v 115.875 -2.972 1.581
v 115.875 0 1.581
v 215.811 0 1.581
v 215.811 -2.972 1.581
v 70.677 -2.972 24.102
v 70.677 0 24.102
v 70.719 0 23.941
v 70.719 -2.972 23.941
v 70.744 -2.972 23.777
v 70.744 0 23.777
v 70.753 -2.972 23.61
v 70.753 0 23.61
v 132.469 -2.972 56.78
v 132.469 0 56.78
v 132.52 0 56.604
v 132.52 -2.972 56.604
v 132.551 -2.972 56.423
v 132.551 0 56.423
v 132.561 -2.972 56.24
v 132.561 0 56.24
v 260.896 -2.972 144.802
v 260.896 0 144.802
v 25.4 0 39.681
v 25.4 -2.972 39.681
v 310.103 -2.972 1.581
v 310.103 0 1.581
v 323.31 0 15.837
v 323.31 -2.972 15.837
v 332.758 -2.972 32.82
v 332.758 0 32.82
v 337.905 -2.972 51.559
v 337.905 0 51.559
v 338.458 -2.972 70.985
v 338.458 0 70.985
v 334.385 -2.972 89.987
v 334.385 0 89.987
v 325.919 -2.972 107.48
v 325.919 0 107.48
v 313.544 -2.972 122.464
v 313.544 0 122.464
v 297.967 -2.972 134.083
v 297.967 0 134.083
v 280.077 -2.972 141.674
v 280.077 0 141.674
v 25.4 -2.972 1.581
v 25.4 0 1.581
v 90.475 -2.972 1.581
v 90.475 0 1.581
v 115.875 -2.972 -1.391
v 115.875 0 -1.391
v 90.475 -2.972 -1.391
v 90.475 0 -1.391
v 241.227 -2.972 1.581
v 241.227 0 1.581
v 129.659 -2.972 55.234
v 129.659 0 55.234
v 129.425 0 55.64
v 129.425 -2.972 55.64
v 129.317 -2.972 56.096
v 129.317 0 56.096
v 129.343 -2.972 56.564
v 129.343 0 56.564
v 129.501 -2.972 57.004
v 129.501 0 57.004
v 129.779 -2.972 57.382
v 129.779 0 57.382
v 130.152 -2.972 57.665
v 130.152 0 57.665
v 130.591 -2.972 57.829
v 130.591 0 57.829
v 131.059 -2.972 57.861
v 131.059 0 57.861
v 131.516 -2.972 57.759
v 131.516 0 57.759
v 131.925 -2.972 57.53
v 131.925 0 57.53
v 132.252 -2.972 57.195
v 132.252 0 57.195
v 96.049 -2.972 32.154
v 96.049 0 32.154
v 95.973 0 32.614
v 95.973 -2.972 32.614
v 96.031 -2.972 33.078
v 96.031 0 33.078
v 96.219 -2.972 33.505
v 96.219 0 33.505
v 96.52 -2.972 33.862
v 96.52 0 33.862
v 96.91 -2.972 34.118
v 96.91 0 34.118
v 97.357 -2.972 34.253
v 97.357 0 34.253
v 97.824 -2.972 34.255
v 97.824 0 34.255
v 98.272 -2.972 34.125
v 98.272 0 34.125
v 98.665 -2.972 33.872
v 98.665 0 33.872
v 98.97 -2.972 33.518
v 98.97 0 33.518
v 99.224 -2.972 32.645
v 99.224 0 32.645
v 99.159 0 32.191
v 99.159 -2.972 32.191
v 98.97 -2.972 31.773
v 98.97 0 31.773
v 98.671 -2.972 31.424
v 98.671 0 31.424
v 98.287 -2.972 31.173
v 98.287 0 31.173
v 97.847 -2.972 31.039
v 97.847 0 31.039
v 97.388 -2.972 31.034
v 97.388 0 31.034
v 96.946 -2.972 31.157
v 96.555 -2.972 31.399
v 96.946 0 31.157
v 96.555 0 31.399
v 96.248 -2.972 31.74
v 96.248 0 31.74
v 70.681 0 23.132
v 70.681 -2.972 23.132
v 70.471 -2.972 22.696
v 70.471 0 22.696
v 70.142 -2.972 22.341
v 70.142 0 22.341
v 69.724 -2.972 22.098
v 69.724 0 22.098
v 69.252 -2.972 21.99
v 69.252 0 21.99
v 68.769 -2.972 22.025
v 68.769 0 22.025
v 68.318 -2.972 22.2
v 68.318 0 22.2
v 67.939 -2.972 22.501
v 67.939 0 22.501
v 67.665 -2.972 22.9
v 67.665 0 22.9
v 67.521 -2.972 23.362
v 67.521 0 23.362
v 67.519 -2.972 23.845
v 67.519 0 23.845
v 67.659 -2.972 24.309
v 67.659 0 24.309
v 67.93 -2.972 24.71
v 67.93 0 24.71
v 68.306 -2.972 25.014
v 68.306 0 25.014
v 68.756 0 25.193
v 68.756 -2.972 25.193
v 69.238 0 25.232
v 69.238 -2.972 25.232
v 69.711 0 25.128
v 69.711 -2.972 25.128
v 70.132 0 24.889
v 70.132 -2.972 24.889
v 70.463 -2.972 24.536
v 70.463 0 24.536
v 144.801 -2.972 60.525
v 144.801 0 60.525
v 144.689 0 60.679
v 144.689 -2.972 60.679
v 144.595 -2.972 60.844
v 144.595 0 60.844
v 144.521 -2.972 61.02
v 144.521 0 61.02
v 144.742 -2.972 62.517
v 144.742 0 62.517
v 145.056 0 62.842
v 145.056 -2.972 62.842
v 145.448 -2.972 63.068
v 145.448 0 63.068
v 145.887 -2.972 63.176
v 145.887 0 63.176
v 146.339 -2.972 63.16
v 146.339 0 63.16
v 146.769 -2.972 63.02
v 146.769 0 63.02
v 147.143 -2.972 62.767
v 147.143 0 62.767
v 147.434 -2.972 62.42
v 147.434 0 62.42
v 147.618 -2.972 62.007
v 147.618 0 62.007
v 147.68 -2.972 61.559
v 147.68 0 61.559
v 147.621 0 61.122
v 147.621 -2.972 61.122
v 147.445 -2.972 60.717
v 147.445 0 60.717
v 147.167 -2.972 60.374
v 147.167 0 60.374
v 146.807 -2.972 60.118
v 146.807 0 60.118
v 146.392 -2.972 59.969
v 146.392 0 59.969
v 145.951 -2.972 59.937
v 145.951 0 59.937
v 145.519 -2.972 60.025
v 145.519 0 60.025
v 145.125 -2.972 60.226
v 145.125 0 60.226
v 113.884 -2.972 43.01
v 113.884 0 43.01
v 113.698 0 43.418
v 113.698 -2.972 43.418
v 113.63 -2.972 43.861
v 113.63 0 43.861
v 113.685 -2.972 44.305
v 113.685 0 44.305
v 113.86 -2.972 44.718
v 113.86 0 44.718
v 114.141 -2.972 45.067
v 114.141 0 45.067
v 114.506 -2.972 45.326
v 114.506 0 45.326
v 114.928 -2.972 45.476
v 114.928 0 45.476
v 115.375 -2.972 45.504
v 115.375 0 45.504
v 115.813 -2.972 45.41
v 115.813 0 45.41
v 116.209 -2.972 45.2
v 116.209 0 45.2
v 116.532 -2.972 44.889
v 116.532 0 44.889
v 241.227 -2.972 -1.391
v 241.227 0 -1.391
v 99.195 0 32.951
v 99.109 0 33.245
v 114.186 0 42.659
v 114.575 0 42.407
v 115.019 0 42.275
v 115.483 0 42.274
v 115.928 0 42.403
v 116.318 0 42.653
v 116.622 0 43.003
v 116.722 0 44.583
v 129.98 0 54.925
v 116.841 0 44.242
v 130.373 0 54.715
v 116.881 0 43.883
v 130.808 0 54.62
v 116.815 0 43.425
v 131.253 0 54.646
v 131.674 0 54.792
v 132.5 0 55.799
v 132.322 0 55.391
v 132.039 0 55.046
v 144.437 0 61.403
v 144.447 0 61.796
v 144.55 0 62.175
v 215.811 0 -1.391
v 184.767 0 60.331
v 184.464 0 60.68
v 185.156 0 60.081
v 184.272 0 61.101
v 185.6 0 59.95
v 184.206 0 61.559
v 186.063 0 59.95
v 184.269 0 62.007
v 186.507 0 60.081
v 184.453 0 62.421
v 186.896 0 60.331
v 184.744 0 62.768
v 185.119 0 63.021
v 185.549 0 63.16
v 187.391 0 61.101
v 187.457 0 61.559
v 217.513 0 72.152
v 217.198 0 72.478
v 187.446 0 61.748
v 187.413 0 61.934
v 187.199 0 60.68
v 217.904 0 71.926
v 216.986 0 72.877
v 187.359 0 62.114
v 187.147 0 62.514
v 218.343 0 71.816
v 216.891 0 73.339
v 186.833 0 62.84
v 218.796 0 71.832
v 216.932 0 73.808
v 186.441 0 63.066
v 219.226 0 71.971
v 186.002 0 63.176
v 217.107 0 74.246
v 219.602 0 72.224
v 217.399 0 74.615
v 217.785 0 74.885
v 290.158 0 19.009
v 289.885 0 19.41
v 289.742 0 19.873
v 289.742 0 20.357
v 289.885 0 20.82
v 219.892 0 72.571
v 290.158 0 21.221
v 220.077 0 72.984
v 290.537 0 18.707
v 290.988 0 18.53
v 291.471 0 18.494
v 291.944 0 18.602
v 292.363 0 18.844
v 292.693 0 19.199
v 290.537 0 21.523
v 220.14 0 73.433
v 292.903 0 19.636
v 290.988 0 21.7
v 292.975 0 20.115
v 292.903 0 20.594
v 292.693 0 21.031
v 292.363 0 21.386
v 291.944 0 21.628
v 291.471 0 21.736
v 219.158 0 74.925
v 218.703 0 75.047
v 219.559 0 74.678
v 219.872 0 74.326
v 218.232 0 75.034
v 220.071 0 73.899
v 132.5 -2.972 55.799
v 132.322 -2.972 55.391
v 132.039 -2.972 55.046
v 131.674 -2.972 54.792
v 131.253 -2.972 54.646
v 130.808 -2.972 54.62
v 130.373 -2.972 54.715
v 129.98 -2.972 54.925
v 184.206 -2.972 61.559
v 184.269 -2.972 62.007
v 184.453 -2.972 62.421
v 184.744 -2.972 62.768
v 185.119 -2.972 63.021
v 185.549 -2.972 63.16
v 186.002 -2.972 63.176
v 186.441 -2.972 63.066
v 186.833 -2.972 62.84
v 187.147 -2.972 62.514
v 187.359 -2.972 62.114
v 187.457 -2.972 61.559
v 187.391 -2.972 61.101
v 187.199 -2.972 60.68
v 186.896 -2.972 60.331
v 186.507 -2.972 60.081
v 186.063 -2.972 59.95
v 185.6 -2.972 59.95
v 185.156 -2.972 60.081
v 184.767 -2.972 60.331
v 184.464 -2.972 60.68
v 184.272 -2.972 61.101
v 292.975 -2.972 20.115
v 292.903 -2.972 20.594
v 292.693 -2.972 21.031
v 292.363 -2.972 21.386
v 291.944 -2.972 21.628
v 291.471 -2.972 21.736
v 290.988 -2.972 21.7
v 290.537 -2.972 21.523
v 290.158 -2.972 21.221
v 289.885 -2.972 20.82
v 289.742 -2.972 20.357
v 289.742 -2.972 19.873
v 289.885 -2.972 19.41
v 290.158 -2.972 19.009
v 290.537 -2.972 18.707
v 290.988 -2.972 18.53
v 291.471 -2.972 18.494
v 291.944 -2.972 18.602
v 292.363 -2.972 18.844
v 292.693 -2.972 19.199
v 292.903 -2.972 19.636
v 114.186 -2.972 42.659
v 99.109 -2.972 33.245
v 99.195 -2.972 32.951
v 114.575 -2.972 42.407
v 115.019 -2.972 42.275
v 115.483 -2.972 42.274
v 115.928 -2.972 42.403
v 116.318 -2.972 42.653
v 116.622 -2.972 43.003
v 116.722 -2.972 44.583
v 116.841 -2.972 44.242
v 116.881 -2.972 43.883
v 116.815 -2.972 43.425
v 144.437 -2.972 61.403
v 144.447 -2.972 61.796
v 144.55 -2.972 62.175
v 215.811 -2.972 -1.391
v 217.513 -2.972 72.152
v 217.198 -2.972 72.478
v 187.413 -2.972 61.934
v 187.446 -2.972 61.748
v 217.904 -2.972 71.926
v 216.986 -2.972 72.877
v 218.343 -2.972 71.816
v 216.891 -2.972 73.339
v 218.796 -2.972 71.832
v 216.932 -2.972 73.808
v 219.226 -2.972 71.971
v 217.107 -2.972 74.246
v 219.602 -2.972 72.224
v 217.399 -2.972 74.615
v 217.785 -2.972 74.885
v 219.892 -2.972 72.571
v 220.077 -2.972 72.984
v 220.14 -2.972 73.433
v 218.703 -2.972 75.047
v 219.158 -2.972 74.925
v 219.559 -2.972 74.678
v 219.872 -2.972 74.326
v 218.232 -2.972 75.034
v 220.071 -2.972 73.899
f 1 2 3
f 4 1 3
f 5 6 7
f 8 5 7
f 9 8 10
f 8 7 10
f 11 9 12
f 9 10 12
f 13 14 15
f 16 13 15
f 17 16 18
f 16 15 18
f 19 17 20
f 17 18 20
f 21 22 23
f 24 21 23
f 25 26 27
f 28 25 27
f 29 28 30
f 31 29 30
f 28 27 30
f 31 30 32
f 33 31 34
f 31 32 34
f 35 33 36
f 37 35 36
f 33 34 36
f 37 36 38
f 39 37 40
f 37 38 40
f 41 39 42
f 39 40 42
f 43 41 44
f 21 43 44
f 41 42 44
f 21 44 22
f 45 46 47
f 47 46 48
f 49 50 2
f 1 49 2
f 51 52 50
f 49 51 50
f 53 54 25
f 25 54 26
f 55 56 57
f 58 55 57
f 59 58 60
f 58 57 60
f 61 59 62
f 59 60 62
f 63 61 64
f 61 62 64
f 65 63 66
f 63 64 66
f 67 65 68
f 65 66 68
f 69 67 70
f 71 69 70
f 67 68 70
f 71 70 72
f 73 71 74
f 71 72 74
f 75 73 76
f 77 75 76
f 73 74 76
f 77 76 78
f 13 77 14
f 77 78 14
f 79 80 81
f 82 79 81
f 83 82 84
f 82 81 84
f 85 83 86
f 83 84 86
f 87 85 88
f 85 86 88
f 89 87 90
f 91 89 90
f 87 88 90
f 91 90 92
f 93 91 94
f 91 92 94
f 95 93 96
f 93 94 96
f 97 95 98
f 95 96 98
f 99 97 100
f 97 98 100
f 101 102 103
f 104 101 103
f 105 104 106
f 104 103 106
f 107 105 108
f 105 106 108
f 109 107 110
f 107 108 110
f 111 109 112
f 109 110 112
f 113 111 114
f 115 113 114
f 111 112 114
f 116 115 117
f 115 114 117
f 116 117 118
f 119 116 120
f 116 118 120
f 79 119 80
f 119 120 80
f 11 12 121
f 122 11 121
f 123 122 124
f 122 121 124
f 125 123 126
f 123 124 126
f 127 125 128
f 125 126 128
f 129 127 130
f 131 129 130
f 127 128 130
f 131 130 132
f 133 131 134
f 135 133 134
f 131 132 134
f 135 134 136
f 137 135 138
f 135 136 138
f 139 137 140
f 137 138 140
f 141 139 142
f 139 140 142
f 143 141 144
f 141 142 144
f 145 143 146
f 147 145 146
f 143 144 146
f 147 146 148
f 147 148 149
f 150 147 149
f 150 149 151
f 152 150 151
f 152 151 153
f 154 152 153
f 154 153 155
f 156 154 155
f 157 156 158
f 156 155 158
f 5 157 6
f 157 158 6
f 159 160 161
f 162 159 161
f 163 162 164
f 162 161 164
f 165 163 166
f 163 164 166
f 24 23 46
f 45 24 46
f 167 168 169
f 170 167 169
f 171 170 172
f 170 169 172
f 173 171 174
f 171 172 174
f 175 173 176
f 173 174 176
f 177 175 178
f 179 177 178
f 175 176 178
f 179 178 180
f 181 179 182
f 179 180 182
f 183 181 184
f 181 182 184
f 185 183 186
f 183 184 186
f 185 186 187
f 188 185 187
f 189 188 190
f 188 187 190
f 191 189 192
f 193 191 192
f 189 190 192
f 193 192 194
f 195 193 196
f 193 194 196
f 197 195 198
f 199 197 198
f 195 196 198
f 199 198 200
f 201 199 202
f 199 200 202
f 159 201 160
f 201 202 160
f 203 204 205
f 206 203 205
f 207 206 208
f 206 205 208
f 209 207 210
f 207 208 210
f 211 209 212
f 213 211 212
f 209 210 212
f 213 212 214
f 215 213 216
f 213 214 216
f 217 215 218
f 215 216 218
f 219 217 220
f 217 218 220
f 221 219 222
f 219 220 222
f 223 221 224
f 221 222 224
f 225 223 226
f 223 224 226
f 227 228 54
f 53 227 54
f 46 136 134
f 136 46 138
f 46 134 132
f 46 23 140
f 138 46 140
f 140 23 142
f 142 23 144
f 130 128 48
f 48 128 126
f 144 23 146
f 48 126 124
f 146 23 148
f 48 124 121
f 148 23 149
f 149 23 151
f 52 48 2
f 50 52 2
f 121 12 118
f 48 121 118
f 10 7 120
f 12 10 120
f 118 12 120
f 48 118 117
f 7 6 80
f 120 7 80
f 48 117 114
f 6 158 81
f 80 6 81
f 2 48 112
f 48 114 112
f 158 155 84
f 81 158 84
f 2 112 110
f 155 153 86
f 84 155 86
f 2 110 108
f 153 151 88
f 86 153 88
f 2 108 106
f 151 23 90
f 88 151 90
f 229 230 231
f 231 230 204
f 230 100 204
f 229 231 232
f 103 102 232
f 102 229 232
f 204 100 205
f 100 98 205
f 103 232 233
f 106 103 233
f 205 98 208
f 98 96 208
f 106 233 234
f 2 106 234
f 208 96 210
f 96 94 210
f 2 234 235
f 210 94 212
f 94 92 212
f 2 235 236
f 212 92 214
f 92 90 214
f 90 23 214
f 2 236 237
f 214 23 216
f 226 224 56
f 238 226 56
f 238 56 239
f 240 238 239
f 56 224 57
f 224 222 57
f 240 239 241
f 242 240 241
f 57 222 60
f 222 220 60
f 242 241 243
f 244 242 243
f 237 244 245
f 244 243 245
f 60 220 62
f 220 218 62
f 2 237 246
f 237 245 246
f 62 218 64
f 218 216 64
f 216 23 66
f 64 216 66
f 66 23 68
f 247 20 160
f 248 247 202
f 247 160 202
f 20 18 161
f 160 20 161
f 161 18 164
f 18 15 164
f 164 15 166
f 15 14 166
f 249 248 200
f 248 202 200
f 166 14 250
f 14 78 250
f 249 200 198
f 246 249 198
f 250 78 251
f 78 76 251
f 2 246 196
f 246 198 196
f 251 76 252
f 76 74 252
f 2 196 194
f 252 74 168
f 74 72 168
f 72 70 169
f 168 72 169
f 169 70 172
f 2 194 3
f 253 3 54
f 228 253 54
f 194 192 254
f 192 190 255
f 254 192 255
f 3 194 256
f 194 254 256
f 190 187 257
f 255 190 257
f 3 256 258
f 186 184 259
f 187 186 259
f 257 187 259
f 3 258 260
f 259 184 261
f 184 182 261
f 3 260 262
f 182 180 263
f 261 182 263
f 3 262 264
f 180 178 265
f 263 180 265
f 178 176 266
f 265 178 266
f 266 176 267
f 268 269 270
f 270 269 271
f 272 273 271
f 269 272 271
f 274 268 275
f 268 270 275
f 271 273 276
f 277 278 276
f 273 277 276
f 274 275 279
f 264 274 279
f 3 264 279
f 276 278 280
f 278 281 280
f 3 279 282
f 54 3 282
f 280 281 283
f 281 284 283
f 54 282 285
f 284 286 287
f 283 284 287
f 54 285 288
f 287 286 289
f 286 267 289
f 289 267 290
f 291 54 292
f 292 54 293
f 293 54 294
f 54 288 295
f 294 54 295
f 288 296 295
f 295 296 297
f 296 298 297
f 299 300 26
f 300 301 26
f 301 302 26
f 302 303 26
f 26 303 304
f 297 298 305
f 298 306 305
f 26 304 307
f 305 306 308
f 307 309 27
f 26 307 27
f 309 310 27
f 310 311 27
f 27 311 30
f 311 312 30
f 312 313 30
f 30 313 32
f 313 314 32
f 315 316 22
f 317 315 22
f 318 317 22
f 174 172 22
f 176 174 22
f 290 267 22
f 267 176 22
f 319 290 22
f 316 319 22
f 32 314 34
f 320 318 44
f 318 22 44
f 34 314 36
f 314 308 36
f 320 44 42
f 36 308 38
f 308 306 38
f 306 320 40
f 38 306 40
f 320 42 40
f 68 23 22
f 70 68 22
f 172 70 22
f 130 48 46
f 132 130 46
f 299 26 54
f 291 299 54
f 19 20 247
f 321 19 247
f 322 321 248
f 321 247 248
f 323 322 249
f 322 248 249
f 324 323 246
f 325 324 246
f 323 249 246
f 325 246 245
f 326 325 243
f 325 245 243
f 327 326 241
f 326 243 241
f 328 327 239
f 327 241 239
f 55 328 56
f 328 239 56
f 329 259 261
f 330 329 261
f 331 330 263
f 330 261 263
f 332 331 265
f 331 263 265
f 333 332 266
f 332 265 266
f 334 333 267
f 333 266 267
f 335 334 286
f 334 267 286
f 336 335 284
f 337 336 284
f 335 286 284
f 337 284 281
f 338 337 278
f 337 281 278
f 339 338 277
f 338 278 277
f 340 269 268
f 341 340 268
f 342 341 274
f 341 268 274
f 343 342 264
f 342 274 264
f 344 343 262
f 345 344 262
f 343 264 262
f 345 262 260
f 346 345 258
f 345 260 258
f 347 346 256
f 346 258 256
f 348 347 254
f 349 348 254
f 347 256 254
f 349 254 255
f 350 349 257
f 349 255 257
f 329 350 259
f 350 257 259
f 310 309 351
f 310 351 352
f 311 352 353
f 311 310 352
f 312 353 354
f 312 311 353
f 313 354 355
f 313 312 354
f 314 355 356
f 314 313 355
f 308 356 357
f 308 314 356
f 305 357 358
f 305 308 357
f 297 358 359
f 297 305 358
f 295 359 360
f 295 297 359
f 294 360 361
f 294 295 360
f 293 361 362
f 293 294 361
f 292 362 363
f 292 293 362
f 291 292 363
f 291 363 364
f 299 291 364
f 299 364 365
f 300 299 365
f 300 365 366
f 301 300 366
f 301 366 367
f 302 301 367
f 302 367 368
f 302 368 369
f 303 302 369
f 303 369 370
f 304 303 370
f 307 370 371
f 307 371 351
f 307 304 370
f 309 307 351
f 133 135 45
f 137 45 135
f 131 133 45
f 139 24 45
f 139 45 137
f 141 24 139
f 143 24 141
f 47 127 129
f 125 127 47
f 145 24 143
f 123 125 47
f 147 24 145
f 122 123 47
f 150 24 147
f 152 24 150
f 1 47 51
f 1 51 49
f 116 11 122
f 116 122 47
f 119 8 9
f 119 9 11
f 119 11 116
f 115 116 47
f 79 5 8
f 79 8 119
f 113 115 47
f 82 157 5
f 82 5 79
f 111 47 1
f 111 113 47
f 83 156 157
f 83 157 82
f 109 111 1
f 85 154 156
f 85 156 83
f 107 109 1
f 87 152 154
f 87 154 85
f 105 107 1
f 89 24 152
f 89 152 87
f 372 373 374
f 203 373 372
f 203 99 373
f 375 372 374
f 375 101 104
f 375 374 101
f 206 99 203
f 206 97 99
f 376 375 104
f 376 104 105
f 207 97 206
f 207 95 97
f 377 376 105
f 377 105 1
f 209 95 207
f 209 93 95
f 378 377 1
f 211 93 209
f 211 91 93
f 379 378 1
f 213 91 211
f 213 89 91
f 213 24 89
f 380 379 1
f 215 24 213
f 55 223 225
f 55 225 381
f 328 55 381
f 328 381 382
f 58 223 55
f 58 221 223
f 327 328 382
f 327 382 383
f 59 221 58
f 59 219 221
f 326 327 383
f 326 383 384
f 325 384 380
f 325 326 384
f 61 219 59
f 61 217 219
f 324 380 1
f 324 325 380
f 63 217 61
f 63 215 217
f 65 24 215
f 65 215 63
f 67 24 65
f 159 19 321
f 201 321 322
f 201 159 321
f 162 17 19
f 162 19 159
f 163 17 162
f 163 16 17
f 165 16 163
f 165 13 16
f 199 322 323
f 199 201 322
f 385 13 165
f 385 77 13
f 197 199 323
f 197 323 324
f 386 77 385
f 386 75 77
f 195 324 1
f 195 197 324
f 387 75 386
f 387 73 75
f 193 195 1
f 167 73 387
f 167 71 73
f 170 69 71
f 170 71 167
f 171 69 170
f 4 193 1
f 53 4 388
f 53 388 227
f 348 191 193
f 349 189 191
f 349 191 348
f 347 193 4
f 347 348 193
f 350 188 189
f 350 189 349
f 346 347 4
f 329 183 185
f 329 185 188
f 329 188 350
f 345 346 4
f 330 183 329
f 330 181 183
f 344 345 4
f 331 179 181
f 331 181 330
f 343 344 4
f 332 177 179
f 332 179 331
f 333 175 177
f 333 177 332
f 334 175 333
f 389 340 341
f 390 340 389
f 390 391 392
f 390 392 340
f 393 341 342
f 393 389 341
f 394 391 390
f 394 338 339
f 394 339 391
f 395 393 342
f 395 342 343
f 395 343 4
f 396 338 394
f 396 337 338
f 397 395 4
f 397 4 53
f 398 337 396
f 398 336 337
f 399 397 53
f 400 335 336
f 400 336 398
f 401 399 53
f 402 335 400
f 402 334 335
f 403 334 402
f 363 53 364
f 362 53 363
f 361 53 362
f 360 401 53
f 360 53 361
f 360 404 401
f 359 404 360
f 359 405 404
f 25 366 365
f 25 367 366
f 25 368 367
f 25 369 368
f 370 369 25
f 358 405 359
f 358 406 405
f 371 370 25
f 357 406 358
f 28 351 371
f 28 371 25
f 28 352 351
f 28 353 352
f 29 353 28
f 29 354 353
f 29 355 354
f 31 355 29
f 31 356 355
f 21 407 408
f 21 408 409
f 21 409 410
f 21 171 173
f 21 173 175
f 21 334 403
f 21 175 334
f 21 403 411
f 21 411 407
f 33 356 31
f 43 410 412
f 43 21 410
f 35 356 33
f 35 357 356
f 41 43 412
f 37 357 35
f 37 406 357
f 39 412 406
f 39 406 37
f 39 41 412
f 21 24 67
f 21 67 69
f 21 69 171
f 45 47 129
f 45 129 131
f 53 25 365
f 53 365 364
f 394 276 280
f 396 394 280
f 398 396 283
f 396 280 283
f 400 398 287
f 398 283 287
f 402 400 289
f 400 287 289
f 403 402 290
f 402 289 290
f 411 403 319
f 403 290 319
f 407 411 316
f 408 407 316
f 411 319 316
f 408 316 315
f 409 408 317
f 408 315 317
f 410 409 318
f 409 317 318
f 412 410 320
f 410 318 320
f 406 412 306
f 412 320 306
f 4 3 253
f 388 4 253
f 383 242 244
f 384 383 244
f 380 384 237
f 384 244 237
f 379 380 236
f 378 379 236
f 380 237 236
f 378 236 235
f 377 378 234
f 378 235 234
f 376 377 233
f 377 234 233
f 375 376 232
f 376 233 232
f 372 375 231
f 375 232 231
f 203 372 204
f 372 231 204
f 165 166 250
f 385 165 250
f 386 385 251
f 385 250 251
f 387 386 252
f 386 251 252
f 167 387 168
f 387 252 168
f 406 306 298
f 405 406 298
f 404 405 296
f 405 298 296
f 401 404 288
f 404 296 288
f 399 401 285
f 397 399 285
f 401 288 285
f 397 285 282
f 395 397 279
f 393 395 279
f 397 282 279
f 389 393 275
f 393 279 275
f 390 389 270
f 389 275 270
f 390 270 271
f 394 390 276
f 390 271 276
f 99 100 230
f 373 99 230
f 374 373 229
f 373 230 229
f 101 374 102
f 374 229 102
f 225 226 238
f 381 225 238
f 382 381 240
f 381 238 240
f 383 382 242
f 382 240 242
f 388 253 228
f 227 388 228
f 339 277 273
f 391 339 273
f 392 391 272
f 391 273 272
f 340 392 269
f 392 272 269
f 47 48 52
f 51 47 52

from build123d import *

# Parameters (mm, degrees)
F0_R     = 1.6256
F1_DEPTH = 2.9718


with BuildPart() as f1:
    # F0 (on Front) → F1 (new body)
    with BuildSketch(Plane.XZ):
        with BuildLine():
            ThreePointArc((216.986084, 72.877465), (218.795783, 71.831543), (220.139584, 73.432532))
            ThreePointArc((220.139584, 73.432532), (218.232184, 75.03352), (216.986084, 72.877465))
        make_face()
        with BuildLine():
            ThreePointArc((70.752836, 23.610366), (70.733686, 23.85915), (70.676688, 24.102072))
            ThreePointArc((70.676688, 24.102072), (67.520786, 23.361582), (70.752836, 23.610366))
        make_face()
        with BuildLine():
            Line((260.896319, 144.802258), (25.4, 39.681211))
            Line((25.4, 39.681211), (25.4, 1.581211))
            Line((25.4, 1.581211), (90.4748, 1.581211))
            Line((90.4748, 1.581211), (90.4748, -1.390589))
            Line((90.4748, -1.390589), (115.8748, -1.390589))
            Line((115.8748, -1.390589), (115.8748, 1.581211))
            Line((115.8748, 1.581211), (215.811484, 1.581211))
            Line((215.811484, 1.581211), (215.811484, -1.390589))
            Line((215.811484, -1.390589), (241.227301, -1.390589))
            Line((241.227301, -1.390589), (241.227301, 1.581211))
            Line((241.227301, 1.581211), (310.102867, 1.581211))
            ThreePointArc((310.102867, 1.581211), (334.385206, 89.987396), (260.896319, 144.802258))
        make_face()
        with BuildLine():
            ThreePointArc((70.752836, 23.610366), (67.520786, 23.361582), (70.676688, 24.102072))
            ThreePointArc((70.676688, 24.102072), (70.733686, 23.85915), (70.752836, 23.610366))
        make_face(mode=Mode.SUBTRACT)
        with BuildLine():
            ThreePointArc((96.048958, 32.153762), (96.910351, 34.118272), (98.969804, 33.518311))
            ThreePointArc((98.969804, 33.518311), (99.159165, 33.100022), (99.22401, 32.645468))
            ThreePointArc((99.22401, 32.645468), (97.847193, 31.039018), (96.048958, 32.153762))
        make_face(mode=Mode.SUBTRACT)
        with BuildLine():
            ThreePointArc((113.883712, 43.010474), (114.314419, 45.209093), (116.531911, 44.889469))
            ThreePointArc((116.531911, 44.889469), (116.791034, 44.415764), (116.880706, 43.883316))
            ThreePointArc((116.880706, 43.883316), (115.709659, 42.322561), (113.883712, 43.010474))
        make_face(mode=Mode.SUBTRACT)
        with BuildLine():
            ThreePointArc((129.659065, 55.23398), (130.152459, 57.664507), (132.469333, 56.779638))
            ThreePointArc((132.469333, 56.779638), (132.53827, 56.513791), (132.56147, 56.240133))
            ThreePointArc((132.56147, 56.240133), (131.468318, 54.704205), (129.659065, 55.23398))
        make_face(mode=Mode.SUBTRACT)
        with BuildLine():
            ThreePointArc((144.74166, 62.517484), (146.558763, 63.104845), (147.680459, 61.559317))
            ThreePointArc((147.680459, 61.559317), (146.604455, 60.029441), (144.800882, 60.524852))
            ThreePointArc((144.800882, 60.524852), (144.639337, 60.760022), (144.521396, 61.019812))
            ThreePointArc((144.521396, 61.019812), (144.44656, 61.795852), (144.74166, 62.517484))
        make_face(mode=Mode.SUBTRACT)
        with Locations((291.349751, 20.115141)):
            Circle(F0_R, mode=Mode.SUBTRACT)
        with BuildLine():
            ThreePointArc((184.205659, 61.559317), (185.549459, 63.160306), (187.359158, 62.114383))
            ThreePointArc((187.359158, 62.114383), (187.432248, 61.841117), (187.456859, 61.559317))
            ThreePointArc((187.456859, 61.559317), (185.831259, 59.933717), (184.205659, 61.559317))
        make_face(mode=Mode.SUBTRACT)
        with BuildLine():
            ThreePointArc((216.986084, 72.877465), (218.232184, 75.03352), (220.139584, 73.432532))
            ThreePointArc((220.139584, 73.432532), (218.795783, 71.831543), (216.986084, 72.877465))
        make_face(mode=Mode.SUBTRACT)
    extrude(amount=F1_DEPTH)


solid = f1.part
